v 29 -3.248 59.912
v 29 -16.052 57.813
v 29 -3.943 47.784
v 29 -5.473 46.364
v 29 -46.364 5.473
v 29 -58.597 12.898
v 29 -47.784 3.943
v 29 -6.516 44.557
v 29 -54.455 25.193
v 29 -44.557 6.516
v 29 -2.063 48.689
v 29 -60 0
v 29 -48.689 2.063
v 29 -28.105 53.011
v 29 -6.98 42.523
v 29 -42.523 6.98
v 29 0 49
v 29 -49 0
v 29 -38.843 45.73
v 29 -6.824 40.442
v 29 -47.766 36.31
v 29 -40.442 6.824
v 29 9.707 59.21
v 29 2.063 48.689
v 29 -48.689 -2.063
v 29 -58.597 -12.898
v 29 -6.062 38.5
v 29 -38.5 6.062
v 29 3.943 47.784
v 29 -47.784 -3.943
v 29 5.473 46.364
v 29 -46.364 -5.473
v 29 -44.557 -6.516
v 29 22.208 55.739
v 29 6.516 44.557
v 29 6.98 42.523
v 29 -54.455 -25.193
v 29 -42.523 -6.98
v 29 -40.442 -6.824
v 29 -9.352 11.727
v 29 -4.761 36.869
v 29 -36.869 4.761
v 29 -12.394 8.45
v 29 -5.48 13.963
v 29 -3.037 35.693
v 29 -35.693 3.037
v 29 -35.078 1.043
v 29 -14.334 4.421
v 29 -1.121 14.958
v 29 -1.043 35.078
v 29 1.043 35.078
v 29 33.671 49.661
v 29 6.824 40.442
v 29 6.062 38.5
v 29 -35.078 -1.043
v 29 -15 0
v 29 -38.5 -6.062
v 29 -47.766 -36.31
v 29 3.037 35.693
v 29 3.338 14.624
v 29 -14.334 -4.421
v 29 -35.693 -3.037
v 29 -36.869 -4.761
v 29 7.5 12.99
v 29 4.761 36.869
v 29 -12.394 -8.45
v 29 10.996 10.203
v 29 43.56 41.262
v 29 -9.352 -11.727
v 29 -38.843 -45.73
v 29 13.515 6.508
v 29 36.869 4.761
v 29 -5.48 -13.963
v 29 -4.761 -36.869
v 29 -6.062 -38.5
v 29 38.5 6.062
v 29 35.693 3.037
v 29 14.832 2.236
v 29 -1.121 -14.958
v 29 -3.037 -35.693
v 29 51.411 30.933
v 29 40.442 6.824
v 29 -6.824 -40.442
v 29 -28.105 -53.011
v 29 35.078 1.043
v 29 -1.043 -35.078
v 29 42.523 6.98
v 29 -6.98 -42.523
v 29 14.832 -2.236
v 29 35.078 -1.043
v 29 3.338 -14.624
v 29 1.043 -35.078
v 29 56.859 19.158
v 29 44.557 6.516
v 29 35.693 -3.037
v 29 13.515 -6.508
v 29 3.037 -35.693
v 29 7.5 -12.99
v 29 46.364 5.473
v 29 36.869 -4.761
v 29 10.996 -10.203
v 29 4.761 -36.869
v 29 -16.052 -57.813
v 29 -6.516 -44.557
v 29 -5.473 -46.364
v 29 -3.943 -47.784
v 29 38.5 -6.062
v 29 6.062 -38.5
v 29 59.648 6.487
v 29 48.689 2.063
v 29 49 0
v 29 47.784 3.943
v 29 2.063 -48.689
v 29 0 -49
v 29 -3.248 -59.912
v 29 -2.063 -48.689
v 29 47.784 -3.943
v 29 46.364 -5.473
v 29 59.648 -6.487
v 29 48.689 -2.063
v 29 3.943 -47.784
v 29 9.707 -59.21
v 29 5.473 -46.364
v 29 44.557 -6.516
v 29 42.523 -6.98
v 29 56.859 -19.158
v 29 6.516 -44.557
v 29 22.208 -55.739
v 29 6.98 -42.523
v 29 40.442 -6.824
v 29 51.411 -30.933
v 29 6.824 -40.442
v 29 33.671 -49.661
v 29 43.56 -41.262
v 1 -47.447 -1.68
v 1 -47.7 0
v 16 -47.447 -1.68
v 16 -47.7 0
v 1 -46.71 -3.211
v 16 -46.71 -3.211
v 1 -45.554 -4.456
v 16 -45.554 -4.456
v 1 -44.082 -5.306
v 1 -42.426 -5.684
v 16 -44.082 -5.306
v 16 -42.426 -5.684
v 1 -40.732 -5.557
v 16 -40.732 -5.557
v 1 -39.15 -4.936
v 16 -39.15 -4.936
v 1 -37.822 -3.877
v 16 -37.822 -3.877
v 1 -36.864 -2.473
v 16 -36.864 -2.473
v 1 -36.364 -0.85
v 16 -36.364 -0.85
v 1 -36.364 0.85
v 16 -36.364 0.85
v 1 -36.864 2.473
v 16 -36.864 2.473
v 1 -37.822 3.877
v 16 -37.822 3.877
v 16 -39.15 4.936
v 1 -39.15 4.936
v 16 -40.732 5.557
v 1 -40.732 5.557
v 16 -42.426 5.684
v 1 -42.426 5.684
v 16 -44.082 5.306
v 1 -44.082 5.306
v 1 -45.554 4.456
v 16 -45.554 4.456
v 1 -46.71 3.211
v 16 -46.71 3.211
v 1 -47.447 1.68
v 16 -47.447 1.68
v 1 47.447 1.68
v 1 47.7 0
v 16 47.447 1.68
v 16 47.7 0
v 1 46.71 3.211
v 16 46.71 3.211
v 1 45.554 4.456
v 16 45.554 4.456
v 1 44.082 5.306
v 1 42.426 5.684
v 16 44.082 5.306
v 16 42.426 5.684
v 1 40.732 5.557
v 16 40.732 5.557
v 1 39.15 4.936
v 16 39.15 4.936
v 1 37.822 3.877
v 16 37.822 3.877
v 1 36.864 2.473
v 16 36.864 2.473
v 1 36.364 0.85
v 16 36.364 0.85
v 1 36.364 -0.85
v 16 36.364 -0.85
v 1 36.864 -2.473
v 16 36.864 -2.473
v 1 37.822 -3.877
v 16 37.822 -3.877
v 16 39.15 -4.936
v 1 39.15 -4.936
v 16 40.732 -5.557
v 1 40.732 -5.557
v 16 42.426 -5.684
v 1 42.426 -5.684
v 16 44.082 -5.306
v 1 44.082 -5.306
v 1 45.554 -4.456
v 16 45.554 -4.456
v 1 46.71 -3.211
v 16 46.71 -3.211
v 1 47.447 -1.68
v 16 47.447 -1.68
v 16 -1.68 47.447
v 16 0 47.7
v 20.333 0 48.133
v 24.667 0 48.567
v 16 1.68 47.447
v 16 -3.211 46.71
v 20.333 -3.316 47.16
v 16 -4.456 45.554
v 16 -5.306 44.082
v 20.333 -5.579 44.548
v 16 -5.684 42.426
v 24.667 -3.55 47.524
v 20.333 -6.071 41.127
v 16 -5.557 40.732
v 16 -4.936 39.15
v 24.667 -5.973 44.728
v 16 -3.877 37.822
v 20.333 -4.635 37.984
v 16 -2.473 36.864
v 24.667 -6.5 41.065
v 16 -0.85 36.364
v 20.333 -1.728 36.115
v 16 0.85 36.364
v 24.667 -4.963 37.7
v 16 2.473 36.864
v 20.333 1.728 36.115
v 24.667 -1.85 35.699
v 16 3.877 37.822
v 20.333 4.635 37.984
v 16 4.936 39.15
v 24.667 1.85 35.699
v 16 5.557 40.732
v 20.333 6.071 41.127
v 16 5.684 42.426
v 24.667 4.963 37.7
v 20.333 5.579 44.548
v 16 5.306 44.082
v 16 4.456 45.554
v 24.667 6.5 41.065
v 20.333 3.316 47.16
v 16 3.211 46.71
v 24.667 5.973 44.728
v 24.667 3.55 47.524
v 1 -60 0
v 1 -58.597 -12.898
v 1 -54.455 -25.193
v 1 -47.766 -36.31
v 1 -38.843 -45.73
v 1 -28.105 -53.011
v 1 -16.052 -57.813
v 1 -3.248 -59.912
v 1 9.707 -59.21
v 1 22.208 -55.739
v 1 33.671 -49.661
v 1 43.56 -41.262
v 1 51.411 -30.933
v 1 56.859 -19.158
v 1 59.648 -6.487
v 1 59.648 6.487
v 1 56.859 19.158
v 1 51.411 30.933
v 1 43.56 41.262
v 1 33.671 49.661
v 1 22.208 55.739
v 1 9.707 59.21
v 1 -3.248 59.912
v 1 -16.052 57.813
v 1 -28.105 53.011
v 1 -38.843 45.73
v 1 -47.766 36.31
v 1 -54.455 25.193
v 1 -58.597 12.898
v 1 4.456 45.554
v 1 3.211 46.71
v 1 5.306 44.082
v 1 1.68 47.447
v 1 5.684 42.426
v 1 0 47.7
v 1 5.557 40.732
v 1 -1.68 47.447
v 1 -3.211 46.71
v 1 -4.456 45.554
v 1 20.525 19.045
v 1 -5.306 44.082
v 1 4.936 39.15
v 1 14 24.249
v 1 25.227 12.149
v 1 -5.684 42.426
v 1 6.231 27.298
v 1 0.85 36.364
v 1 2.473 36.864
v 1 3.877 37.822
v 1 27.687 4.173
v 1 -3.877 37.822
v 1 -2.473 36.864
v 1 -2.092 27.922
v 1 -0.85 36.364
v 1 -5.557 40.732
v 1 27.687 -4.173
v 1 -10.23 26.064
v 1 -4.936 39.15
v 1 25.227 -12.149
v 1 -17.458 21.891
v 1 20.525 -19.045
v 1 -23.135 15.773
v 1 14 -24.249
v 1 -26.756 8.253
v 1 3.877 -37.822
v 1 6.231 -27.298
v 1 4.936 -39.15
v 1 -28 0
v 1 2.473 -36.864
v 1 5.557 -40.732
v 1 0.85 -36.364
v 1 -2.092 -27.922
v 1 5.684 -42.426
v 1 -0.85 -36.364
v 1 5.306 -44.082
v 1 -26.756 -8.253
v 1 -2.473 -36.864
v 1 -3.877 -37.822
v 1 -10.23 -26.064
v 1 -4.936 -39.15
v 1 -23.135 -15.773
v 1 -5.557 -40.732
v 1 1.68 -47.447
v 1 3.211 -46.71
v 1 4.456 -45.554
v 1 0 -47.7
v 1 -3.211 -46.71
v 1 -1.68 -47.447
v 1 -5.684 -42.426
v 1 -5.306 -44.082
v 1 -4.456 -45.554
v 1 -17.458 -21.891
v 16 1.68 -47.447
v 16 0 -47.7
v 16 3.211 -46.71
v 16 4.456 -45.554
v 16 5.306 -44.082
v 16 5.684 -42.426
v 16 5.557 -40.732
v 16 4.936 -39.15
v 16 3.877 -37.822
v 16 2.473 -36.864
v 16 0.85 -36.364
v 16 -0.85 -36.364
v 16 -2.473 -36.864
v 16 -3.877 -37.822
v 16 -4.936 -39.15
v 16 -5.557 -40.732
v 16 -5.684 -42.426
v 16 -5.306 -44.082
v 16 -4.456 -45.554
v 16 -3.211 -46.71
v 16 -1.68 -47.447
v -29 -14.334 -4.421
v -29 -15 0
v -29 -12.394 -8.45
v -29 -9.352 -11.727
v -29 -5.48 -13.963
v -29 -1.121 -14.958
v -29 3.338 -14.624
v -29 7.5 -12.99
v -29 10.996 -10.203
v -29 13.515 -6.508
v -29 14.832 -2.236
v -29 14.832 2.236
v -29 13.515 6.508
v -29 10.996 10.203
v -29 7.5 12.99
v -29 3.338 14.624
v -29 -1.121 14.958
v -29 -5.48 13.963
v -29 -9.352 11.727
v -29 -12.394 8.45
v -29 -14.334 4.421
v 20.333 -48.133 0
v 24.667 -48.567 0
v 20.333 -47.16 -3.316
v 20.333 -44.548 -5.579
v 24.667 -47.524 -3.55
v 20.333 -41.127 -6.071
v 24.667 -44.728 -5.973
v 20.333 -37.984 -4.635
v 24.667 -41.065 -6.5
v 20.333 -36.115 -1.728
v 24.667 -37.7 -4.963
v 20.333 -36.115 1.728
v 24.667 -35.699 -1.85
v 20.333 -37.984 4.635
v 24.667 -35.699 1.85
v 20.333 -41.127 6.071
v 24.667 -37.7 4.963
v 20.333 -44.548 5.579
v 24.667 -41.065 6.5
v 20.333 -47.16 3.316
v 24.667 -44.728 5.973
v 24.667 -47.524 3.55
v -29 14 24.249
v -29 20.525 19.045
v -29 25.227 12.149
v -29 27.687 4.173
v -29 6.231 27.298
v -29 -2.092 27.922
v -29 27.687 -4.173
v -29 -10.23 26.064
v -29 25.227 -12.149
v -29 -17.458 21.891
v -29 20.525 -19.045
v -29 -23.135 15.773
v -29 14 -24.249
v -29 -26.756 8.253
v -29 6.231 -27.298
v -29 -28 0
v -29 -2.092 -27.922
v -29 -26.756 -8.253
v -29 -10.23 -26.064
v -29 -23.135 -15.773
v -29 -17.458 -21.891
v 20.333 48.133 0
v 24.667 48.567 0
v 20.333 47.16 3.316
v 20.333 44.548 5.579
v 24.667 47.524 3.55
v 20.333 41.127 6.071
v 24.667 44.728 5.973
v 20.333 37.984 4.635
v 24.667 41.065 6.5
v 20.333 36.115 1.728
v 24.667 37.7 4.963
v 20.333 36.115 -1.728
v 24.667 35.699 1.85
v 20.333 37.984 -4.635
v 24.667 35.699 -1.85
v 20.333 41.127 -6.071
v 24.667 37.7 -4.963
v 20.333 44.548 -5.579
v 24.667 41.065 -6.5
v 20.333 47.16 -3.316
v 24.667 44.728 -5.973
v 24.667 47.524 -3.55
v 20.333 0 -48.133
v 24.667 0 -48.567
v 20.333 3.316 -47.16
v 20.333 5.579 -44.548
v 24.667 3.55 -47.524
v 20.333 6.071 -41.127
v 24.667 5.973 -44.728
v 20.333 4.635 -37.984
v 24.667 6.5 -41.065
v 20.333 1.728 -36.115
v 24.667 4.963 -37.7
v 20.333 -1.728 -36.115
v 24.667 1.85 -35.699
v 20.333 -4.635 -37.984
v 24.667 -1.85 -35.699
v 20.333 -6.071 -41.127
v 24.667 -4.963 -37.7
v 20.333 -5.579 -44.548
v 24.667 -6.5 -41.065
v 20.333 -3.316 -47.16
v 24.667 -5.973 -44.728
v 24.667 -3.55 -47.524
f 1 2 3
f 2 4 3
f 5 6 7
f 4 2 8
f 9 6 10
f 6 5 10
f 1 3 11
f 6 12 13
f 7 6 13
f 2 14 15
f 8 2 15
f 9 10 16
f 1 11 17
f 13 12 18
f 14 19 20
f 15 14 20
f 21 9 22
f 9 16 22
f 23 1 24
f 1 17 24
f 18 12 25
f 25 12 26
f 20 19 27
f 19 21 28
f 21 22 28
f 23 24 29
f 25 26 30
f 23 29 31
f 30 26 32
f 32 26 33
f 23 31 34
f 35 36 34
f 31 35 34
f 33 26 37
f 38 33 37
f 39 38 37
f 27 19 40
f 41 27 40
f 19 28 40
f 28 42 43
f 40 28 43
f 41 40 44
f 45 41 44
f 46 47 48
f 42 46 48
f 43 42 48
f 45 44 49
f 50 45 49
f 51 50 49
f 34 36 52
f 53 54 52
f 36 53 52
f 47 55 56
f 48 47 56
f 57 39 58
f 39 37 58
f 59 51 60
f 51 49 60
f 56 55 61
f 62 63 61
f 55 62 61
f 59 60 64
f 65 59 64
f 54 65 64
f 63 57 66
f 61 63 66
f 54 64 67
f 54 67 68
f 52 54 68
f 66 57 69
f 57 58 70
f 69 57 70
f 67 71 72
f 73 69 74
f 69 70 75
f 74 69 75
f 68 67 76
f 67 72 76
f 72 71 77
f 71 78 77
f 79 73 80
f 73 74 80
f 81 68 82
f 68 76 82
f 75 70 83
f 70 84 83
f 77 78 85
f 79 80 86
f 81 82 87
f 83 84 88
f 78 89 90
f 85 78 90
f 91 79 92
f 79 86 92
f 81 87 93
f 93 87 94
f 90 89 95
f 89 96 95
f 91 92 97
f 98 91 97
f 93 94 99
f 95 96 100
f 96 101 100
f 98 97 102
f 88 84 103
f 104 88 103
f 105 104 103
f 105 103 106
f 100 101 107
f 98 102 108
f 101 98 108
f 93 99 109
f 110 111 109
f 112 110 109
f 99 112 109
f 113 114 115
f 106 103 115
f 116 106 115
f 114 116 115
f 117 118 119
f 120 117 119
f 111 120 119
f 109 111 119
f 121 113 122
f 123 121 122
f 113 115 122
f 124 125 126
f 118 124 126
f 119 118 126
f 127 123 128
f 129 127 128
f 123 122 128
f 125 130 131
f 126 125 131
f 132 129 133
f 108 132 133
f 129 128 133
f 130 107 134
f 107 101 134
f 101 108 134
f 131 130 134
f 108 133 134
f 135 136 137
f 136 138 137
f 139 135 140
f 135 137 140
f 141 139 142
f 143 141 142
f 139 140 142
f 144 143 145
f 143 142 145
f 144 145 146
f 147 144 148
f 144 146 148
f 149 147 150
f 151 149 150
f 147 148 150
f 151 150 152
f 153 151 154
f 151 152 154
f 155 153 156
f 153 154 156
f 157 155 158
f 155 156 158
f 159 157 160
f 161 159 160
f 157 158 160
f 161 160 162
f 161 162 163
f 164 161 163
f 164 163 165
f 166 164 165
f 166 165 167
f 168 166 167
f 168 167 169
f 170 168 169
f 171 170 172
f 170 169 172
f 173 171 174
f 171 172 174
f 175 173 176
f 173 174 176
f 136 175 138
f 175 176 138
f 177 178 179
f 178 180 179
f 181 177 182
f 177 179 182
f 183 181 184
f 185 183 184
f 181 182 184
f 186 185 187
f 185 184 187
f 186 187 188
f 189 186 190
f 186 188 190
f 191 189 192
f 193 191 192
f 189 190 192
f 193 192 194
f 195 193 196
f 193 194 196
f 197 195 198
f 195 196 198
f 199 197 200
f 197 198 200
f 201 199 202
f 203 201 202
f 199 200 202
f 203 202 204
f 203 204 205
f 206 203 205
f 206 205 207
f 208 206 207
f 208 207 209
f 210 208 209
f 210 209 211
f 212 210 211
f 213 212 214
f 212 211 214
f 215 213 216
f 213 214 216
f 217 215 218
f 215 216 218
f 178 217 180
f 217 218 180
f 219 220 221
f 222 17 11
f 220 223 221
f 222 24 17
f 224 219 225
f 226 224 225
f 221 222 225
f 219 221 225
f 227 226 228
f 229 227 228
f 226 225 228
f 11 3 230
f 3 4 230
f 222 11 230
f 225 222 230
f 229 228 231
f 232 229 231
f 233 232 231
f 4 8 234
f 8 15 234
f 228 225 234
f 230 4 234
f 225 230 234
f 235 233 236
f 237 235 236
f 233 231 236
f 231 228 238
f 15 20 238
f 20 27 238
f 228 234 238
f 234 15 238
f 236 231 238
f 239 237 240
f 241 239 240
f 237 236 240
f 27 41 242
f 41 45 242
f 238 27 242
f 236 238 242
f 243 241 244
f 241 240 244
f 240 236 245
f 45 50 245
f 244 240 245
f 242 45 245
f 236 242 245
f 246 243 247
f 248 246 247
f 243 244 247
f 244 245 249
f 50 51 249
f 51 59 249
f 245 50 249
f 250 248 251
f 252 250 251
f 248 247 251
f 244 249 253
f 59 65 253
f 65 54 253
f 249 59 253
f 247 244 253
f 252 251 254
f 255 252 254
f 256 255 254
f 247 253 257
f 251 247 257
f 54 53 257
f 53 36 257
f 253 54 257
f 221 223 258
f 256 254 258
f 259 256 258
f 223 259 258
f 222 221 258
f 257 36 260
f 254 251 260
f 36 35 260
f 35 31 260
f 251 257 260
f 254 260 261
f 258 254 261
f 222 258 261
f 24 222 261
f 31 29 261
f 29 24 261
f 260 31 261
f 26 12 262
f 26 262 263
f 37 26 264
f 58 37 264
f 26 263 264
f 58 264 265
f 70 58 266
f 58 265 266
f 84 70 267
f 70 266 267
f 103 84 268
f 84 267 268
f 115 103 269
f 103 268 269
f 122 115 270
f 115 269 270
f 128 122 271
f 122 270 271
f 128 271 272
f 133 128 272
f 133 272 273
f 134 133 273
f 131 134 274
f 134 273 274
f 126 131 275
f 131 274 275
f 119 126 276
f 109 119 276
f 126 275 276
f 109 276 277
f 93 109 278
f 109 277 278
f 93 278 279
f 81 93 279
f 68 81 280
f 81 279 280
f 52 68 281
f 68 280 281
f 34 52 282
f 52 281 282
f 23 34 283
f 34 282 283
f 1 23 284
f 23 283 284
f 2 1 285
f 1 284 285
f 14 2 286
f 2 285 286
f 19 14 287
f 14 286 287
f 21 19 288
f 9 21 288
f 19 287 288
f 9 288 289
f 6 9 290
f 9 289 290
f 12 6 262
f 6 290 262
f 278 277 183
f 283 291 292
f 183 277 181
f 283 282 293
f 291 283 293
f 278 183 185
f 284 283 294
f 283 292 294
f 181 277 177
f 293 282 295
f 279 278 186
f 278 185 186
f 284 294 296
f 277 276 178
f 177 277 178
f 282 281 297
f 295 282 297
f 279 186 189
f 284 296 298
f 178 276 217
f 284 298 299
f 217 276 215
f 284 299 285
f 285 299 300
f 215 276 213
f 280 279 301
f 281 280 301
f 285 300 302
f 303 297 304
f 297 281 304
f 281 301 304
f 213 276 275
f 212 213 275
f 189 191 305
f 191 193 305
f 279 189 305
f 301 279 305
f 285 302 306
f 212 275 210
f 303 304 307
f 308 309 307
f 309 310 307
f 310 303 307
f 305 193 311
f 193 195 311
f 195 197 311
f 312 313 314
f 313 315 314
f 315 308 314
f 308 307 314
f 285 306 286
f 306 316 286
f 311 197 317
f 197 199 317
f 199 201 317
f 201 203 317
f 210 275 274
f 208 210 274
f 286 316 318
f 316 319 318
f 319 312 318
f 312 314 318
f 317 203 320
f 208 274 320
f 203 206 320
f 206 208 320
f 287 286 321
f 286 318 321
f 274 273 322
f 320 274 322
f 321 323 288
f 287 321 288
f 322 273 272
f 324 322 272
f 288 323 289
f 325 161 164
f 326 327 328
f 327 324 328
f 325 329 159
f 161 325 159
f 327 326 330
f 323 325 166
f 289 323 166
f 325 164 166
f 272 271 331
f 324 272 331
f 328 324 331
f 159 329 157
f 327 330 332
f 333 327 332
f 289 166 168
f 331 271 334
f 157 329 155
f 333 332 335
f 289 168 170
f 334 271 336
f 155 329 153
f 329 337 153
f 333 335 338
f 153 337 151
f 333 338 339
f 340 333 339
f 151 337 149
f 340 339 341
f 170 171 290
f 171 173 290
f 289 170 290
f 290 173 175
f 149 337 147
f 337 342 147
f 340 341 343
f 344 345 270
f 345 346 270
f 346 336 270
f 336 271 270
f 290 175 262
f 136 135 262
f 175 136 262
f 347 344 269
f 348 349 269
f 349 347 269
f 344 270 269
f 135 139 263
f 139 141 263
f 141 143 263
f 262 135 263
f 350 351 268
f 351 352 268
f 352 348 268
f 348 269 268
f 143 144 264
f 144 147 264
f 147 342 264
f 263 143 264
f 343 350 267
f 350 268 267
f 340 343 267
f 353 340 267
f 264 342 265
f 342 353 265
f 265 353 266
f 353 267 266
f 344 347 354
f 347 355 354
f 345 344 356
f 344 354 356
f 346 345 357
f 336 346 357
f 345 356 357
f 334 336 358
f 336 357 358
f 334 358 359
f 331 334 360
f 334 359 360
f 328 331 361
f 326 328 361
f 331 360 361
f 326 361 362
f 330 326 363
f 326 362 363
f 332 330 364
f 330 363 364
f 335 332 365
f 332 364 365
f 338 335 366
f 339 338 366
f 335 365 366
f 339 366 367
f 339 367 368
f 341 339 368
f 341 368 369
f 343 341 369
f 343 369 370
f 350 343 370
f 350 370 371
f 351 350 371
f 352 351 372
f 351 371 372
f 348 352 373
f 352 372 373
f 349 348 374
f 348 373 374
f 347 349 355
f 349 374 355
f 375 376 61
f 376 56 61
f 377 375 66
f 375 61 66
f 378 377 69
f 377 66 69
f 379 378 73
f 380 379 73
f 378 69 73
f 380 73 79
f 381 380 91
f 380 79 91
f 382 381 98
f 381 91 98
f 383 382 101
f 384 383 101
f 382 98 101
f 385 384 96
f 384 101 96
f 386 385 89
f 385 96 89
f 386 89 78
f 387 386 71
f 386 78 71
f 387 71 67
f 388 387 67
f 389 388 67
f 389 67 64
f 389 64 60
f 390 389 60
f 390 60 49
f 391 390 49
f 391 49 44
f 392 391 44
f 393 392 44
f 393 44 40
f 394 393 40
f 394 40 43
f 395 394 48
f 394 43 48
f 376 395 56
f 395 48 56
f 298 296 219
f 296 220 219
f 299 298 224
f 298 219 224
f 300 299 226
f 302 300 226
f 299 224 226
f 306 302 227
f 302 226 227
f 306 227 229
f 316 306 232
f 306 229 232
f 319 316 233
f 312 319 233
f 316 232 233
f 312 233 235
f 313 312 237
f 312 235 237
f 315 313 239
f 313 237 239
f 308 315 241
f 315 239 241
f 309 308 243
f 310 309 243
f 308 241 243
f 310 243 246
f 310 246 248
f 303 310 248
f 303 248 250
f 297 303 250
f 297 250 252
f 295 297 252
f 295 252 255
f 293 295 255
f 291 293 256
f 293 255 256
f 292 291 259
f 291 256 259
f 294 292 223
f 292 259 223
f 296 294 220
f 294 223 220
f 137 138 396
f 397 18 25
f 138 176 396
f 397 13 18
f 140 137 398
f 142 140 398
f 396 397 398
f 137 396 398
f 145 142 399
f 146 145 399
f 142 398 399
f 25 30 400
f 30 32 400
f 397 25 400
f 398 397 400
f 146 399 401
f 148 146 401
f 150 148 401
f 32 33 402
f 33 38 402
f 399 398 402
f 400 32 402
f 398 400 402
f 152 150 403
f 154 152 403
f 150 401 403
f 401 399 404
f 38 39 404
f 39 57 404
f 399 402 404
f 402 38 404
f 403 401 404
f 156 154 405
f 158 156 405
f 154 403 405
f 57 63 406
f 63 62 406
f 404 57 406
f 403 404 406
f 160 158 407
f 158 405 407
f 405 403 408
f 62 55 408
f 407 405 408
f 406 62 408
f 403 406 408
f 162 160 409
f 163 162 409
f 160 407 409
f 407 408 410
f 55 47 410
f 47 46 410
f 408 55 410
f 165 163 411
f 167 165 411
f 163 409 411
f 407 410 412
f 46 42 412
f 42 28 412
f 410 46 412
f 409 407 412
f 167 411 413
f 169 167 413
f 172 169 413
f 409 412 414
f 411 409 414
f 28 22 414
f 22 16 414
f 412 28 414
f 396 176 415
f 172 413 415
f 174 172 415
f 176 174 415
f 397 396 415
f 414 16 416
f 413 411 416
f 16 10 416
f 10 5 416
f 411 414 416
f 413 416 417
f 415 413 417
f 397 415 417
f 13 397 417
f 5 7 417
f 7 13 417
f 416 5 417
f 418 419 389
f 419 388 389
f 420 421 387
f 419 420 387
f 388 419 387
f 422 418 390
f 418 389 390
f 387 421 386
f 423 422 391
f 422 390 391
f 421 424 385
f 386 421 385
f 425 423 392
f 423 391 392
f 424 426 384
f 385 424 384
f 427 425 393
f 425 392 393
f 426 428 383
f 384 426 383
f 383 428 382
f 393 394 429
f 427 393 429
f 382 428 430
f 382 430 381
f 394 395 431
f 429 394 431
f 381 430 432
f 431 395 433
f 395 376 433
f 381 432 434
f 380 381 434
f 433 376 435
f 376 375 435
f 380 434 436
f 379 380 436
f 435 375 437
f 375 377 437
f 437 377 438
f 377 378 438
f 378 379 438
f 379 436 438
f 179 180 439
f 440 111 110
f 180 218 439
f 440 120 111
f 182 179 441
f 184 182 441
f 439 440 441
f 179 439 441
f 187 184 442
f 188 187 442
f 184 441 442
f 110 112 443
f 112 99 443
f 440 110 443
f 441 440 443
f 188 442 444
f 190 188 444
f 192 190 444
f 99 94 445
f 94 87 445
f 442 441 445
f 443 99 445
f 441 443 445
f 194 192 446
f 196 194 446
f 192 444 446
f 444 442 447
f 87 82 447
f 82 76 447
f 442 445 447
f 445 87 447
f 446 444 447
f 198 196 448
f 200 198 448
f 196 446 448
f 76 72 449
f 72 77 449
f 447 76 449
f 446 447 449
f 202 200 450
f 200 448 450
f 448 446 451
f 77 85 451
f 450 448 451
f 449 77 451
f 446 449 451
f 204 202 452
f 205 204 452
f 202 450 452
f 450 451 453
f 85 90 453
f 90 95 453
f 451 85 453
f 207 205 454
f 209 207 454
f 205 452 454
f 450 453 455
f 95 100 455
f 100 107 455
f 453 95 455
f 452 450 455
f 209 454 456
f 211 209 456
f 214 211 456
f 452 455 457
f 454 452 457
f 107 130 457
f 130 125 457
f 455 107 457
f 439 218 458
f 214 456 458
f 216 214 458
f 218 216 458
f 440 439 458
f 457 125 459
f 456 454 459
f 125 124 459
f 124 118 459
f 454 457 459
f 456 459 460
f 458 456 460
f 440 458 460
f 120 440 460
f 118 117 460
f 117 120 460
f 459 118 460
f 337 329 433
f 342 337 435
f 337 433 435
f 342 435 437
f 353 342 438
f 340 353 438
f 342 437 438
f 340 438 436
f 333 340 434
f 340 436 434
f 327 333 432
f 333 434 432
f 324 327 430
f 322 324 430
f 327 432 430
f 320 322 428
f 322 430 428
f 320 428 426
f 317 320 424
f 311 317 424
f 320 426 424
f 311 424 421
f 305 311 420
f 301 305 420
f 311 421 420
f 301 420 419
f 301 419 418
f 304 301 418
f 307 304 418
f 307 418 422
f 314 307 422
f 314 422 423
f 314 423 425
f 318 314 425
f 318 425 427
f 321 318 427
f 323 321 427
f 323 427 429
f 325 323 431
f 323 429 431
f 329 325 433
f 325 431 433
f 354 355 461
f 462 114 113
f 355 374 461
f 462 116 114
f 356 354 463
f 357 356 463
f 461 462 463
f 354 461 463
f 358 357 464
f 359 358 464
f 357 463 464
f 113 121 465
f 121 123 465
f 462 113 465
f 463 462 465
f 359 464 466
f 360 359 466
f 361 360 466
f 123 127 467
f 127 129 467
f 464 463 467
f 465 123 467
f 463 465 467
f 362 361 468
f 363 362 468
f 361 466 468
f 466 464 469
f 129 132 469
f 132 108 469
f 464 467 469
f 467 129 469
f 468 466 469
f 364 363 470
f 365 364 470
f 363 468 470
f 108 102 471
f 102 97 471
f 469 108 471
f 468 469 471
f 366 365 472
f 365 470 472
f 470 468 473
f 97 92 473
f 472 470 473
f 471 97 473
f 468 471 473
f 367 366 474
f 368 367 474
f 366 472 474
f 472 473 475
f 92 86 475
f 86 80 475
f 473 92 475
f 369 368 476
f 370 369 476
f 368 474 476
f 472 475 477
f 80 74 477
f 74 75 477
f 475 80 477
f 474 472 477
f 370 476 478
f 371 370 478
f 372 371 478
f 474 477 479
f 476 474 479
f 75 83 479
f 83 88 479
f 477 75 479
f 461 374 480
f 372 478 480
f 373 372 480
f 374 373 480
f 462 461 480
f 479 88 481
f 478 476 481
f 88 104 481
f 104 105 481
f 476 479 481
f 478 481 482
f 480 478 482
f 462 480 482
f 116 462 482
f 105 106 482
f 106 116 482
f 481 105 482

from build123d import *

# Parameters (mm, degrees)
PATTERN_CIRCULAR_2_COUNT = 4


with BuildPart() as part:
    # Эскиз1 → Повернуть1 (revolve)
    with BuildSketch(Plane.XY):
        Polygon((-29, -15), (29, -15), (29, -60), (1, -60), (1, -28), (-29, -28), align=None)
    revolve(axis=Axis((-59.74315319, 0, 0), (1, 0, 0)))

    # Эскиз3 → Вырез-Повернуть1 (revolve, cut)
    with BuildSketch(Plane.XY):
        Polygon((29, 42), (1, 42), (1, 47.7), (16, 47.7), (29, 49), align=None)
    cut_revolve_1 = revolve(axis=Axis((-8.793362521, 42, 0), (1, 0, 0)), mode=Mode.SUBTRACT)

    # Круговой массив2: Вырез-Повернуть1 ×4 about axis
    pattern_circular_2_axis = Axis((0, 0, 0), (1, 0, 0))
    for i in range(1, PATTERN_CIRCULAR_2_COUNT):
        add(cut_revolve_1.rotate(pattern_circular_2_axis, i * 360 / PATTERN_CIRCULAR_2_COUNT), mode=Mode.SUBTRACT)


solid = part.part
